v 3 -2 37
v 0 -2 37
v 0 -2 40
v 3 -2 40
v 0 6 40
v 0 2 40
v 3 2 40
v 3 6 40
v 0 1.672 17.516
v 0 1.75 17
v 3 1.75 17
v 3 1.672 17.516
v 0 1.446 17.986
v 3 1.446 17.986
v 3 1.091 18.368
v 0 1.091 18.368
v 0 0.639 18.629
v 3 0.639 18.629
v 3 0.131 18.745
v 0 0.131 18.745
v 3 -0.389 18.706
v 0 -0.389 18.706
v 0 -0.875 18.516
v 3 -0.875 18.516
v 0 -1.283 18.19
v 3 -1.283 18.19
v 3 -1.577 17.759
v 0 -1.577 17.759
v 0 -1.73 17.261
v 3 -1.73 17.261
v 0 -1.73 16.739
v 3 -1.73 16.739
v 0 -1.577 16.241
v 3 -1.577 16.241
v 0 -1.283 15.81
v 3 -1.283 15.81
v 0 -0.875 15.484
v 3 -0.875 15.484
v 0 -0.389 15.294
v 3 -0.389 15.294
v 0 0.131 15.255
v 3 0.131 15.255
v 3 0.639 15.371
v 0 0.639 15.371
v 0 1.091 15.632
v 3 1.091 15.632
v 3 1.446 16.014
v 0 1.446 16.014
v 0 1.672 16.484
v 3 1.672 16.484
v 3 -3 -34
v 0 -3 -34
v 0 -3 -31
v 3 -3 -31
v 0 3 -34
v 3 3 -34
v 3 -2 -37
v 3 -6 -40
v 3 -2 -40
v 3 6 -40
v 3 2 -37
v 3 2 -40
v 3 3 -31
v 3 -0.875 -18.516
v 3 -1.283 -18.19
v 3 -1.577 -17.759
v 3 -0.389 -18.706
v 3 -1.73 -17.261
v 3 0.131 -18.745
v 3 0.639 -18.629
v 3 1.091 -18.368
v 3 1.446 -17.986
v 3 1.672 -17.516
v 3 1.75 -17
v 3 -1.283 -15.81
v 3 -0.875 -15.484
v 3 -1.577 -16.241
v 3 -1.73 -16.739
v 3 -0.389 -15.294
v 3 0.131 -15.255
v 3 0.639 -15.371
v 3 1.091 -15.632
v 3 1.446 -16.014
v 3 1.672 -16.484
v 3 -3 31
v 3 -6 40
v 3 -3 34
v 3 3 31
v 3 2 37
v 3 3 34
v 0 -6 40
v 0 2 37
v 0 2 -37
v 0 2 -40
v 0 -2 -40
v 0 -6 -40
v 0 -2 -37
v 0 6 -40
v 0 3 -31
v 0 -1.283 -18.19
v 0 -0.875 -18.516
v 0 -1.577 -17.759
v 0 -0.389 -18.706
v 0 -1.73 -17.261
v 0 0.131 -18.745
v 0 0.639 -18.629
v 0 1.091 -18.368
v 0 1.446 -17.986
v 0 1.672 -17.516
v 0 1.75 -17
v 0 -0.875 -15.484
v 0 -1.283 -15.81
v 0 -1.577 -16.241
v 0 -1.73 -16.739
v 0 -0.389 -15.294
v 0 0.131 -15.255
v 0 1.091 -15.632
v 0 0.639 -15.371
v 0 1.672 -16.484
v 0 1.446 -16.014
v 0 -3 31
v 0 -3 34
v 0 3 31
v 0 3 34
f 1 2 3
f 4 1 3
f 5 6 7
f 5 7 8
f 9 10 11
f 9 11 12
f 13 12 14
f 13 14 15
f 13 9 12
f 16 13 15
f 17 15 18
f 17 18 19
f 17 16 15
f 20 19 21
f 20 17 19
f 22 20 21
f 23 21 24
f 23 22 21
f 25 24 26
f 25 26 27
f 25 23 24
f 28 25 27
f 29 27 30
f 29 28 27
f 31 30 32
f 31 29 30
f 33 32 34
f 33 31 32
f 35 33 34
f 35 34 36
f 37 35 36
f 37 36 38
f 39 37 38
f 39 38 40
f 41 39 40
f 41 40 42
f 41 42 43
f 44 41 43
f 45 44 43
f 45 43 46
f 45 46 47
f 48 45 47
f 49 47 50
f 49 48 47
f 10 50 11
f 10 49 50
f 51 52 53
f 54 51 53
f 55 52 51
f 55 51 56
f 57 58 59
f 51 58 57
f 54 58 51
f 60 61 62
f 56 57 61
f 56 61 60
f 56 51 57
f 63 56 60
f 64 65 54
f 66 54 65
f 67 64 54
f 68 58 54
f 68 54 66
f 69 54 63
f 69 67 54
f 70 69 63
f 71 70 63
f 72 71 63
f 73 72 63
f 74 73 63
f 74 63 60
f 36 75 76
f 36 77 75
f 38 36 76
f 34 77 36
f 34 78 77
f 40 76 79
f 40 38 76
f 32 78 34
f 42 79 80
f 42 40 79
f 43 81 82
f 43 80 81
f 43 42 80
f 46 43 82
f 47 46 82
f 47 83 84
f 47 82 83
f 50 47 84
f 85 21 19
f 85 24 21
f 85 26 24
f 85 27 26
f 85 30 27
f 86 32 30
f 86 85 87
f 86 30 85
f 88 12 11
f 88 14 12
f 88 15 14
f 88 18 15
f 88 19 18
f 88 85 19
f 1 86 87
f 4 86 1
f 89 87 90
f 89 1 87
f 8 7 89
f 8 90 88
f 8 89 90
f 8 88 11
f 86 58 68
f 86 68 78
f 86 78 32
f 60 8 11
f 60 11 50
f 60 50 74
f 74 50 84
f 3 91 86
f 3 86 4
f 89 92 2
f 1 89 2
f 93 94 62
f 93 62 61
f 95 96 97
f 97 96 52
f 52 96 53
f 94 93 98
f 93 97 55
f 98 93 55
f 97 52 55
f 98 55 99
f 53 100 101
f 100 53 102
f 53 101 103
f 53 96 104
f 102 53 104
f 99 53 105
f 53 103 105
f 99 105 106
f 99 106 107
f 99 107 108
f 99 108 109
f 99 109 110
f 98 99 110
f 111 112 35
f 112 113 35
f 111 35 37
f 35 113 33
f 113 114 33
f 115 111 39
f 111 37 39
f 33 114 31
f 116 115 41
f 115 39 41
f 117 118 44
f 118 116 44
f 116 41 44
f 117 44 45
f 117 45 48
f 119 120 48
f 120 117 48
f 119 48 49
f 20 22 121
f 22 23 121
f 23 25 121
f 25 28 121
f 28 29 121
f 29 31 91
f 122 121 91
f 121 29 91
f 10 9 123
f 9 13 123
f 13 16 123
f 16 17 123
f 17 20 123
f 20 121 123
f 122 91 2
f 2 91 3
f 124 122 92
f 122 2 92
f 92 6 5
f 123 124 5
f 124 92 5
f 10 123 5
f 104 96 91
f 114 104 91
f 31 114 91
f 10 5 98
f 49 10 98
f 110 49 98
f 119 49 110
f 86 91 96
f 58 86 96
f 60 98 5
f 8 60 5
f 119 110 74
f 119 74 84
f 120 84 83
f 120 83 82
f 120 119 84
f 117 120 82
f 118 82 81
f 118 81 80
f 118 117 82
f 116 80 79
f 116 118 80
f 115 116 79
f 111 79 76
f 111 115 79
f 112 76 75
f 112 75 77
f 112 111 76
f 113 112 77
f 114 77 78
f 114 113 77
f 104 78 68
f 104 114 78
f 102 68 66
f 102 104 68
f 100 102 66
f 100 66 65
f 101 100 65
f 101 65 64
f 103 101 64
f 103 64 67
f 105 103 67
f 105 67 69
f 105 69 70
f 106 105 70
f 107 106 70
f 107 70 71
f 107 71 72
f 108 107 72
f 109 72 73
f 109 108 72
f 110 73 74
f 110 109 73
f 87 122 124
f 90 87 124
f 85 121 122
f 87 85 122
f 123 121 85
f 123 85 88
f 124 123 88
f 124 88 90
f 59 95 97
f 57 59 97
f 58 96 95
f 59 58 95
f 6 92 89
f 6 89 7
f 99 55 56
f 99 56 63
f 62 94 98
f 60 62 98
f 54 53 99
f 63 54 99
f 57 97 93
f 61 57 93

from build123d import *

# Parameters (mm, degrees)
F0_W     = 6
F0_H     = 3
F0_R     = 1.75
F0_W_2   = 4
F1_DEPTH = 3


with BuildPart() as f1:
    # F0 (on Right) → F1 (new body)
    with BuildSketch(Plane.YZ):
        Polygon((6, -37), (6, 37), (2, 37), (-2, 37), (-6, 37), (-6, -37), (-2, -37), (2, -37), align=None)
        with Locations((0, -32.5)):
            Rectangle(F0_W, F0_H, mode=Mode.SUBTRACT)
        with Locations((0, -17)):
            Circle(F0_R, mode=Mode.SUBTRACT)
        with Locations((0, 17)):
            Circle(F0_R, mode=Mode.SUBTRACT)
        with Locations((0, 32.5)):
            Rectangle(F0_W, F0_H, mode=Mode.SUBTRACT)
        with Locations((4, 38.5)):
            Rectangle(F0_W_2, F0_H)
        with Locations((4, -38.5)):
            Rectangle(F0_W_2, F0_H)
        with Locations((-4, 38.5)):
            Rectangle(F0_W_2, F0_H)
        with Locations((-4, -38.5)):
            Rectangle(F0_W_2, F0_H)
    extrude(amount=F1_DEPTH)


solid = f1.part
